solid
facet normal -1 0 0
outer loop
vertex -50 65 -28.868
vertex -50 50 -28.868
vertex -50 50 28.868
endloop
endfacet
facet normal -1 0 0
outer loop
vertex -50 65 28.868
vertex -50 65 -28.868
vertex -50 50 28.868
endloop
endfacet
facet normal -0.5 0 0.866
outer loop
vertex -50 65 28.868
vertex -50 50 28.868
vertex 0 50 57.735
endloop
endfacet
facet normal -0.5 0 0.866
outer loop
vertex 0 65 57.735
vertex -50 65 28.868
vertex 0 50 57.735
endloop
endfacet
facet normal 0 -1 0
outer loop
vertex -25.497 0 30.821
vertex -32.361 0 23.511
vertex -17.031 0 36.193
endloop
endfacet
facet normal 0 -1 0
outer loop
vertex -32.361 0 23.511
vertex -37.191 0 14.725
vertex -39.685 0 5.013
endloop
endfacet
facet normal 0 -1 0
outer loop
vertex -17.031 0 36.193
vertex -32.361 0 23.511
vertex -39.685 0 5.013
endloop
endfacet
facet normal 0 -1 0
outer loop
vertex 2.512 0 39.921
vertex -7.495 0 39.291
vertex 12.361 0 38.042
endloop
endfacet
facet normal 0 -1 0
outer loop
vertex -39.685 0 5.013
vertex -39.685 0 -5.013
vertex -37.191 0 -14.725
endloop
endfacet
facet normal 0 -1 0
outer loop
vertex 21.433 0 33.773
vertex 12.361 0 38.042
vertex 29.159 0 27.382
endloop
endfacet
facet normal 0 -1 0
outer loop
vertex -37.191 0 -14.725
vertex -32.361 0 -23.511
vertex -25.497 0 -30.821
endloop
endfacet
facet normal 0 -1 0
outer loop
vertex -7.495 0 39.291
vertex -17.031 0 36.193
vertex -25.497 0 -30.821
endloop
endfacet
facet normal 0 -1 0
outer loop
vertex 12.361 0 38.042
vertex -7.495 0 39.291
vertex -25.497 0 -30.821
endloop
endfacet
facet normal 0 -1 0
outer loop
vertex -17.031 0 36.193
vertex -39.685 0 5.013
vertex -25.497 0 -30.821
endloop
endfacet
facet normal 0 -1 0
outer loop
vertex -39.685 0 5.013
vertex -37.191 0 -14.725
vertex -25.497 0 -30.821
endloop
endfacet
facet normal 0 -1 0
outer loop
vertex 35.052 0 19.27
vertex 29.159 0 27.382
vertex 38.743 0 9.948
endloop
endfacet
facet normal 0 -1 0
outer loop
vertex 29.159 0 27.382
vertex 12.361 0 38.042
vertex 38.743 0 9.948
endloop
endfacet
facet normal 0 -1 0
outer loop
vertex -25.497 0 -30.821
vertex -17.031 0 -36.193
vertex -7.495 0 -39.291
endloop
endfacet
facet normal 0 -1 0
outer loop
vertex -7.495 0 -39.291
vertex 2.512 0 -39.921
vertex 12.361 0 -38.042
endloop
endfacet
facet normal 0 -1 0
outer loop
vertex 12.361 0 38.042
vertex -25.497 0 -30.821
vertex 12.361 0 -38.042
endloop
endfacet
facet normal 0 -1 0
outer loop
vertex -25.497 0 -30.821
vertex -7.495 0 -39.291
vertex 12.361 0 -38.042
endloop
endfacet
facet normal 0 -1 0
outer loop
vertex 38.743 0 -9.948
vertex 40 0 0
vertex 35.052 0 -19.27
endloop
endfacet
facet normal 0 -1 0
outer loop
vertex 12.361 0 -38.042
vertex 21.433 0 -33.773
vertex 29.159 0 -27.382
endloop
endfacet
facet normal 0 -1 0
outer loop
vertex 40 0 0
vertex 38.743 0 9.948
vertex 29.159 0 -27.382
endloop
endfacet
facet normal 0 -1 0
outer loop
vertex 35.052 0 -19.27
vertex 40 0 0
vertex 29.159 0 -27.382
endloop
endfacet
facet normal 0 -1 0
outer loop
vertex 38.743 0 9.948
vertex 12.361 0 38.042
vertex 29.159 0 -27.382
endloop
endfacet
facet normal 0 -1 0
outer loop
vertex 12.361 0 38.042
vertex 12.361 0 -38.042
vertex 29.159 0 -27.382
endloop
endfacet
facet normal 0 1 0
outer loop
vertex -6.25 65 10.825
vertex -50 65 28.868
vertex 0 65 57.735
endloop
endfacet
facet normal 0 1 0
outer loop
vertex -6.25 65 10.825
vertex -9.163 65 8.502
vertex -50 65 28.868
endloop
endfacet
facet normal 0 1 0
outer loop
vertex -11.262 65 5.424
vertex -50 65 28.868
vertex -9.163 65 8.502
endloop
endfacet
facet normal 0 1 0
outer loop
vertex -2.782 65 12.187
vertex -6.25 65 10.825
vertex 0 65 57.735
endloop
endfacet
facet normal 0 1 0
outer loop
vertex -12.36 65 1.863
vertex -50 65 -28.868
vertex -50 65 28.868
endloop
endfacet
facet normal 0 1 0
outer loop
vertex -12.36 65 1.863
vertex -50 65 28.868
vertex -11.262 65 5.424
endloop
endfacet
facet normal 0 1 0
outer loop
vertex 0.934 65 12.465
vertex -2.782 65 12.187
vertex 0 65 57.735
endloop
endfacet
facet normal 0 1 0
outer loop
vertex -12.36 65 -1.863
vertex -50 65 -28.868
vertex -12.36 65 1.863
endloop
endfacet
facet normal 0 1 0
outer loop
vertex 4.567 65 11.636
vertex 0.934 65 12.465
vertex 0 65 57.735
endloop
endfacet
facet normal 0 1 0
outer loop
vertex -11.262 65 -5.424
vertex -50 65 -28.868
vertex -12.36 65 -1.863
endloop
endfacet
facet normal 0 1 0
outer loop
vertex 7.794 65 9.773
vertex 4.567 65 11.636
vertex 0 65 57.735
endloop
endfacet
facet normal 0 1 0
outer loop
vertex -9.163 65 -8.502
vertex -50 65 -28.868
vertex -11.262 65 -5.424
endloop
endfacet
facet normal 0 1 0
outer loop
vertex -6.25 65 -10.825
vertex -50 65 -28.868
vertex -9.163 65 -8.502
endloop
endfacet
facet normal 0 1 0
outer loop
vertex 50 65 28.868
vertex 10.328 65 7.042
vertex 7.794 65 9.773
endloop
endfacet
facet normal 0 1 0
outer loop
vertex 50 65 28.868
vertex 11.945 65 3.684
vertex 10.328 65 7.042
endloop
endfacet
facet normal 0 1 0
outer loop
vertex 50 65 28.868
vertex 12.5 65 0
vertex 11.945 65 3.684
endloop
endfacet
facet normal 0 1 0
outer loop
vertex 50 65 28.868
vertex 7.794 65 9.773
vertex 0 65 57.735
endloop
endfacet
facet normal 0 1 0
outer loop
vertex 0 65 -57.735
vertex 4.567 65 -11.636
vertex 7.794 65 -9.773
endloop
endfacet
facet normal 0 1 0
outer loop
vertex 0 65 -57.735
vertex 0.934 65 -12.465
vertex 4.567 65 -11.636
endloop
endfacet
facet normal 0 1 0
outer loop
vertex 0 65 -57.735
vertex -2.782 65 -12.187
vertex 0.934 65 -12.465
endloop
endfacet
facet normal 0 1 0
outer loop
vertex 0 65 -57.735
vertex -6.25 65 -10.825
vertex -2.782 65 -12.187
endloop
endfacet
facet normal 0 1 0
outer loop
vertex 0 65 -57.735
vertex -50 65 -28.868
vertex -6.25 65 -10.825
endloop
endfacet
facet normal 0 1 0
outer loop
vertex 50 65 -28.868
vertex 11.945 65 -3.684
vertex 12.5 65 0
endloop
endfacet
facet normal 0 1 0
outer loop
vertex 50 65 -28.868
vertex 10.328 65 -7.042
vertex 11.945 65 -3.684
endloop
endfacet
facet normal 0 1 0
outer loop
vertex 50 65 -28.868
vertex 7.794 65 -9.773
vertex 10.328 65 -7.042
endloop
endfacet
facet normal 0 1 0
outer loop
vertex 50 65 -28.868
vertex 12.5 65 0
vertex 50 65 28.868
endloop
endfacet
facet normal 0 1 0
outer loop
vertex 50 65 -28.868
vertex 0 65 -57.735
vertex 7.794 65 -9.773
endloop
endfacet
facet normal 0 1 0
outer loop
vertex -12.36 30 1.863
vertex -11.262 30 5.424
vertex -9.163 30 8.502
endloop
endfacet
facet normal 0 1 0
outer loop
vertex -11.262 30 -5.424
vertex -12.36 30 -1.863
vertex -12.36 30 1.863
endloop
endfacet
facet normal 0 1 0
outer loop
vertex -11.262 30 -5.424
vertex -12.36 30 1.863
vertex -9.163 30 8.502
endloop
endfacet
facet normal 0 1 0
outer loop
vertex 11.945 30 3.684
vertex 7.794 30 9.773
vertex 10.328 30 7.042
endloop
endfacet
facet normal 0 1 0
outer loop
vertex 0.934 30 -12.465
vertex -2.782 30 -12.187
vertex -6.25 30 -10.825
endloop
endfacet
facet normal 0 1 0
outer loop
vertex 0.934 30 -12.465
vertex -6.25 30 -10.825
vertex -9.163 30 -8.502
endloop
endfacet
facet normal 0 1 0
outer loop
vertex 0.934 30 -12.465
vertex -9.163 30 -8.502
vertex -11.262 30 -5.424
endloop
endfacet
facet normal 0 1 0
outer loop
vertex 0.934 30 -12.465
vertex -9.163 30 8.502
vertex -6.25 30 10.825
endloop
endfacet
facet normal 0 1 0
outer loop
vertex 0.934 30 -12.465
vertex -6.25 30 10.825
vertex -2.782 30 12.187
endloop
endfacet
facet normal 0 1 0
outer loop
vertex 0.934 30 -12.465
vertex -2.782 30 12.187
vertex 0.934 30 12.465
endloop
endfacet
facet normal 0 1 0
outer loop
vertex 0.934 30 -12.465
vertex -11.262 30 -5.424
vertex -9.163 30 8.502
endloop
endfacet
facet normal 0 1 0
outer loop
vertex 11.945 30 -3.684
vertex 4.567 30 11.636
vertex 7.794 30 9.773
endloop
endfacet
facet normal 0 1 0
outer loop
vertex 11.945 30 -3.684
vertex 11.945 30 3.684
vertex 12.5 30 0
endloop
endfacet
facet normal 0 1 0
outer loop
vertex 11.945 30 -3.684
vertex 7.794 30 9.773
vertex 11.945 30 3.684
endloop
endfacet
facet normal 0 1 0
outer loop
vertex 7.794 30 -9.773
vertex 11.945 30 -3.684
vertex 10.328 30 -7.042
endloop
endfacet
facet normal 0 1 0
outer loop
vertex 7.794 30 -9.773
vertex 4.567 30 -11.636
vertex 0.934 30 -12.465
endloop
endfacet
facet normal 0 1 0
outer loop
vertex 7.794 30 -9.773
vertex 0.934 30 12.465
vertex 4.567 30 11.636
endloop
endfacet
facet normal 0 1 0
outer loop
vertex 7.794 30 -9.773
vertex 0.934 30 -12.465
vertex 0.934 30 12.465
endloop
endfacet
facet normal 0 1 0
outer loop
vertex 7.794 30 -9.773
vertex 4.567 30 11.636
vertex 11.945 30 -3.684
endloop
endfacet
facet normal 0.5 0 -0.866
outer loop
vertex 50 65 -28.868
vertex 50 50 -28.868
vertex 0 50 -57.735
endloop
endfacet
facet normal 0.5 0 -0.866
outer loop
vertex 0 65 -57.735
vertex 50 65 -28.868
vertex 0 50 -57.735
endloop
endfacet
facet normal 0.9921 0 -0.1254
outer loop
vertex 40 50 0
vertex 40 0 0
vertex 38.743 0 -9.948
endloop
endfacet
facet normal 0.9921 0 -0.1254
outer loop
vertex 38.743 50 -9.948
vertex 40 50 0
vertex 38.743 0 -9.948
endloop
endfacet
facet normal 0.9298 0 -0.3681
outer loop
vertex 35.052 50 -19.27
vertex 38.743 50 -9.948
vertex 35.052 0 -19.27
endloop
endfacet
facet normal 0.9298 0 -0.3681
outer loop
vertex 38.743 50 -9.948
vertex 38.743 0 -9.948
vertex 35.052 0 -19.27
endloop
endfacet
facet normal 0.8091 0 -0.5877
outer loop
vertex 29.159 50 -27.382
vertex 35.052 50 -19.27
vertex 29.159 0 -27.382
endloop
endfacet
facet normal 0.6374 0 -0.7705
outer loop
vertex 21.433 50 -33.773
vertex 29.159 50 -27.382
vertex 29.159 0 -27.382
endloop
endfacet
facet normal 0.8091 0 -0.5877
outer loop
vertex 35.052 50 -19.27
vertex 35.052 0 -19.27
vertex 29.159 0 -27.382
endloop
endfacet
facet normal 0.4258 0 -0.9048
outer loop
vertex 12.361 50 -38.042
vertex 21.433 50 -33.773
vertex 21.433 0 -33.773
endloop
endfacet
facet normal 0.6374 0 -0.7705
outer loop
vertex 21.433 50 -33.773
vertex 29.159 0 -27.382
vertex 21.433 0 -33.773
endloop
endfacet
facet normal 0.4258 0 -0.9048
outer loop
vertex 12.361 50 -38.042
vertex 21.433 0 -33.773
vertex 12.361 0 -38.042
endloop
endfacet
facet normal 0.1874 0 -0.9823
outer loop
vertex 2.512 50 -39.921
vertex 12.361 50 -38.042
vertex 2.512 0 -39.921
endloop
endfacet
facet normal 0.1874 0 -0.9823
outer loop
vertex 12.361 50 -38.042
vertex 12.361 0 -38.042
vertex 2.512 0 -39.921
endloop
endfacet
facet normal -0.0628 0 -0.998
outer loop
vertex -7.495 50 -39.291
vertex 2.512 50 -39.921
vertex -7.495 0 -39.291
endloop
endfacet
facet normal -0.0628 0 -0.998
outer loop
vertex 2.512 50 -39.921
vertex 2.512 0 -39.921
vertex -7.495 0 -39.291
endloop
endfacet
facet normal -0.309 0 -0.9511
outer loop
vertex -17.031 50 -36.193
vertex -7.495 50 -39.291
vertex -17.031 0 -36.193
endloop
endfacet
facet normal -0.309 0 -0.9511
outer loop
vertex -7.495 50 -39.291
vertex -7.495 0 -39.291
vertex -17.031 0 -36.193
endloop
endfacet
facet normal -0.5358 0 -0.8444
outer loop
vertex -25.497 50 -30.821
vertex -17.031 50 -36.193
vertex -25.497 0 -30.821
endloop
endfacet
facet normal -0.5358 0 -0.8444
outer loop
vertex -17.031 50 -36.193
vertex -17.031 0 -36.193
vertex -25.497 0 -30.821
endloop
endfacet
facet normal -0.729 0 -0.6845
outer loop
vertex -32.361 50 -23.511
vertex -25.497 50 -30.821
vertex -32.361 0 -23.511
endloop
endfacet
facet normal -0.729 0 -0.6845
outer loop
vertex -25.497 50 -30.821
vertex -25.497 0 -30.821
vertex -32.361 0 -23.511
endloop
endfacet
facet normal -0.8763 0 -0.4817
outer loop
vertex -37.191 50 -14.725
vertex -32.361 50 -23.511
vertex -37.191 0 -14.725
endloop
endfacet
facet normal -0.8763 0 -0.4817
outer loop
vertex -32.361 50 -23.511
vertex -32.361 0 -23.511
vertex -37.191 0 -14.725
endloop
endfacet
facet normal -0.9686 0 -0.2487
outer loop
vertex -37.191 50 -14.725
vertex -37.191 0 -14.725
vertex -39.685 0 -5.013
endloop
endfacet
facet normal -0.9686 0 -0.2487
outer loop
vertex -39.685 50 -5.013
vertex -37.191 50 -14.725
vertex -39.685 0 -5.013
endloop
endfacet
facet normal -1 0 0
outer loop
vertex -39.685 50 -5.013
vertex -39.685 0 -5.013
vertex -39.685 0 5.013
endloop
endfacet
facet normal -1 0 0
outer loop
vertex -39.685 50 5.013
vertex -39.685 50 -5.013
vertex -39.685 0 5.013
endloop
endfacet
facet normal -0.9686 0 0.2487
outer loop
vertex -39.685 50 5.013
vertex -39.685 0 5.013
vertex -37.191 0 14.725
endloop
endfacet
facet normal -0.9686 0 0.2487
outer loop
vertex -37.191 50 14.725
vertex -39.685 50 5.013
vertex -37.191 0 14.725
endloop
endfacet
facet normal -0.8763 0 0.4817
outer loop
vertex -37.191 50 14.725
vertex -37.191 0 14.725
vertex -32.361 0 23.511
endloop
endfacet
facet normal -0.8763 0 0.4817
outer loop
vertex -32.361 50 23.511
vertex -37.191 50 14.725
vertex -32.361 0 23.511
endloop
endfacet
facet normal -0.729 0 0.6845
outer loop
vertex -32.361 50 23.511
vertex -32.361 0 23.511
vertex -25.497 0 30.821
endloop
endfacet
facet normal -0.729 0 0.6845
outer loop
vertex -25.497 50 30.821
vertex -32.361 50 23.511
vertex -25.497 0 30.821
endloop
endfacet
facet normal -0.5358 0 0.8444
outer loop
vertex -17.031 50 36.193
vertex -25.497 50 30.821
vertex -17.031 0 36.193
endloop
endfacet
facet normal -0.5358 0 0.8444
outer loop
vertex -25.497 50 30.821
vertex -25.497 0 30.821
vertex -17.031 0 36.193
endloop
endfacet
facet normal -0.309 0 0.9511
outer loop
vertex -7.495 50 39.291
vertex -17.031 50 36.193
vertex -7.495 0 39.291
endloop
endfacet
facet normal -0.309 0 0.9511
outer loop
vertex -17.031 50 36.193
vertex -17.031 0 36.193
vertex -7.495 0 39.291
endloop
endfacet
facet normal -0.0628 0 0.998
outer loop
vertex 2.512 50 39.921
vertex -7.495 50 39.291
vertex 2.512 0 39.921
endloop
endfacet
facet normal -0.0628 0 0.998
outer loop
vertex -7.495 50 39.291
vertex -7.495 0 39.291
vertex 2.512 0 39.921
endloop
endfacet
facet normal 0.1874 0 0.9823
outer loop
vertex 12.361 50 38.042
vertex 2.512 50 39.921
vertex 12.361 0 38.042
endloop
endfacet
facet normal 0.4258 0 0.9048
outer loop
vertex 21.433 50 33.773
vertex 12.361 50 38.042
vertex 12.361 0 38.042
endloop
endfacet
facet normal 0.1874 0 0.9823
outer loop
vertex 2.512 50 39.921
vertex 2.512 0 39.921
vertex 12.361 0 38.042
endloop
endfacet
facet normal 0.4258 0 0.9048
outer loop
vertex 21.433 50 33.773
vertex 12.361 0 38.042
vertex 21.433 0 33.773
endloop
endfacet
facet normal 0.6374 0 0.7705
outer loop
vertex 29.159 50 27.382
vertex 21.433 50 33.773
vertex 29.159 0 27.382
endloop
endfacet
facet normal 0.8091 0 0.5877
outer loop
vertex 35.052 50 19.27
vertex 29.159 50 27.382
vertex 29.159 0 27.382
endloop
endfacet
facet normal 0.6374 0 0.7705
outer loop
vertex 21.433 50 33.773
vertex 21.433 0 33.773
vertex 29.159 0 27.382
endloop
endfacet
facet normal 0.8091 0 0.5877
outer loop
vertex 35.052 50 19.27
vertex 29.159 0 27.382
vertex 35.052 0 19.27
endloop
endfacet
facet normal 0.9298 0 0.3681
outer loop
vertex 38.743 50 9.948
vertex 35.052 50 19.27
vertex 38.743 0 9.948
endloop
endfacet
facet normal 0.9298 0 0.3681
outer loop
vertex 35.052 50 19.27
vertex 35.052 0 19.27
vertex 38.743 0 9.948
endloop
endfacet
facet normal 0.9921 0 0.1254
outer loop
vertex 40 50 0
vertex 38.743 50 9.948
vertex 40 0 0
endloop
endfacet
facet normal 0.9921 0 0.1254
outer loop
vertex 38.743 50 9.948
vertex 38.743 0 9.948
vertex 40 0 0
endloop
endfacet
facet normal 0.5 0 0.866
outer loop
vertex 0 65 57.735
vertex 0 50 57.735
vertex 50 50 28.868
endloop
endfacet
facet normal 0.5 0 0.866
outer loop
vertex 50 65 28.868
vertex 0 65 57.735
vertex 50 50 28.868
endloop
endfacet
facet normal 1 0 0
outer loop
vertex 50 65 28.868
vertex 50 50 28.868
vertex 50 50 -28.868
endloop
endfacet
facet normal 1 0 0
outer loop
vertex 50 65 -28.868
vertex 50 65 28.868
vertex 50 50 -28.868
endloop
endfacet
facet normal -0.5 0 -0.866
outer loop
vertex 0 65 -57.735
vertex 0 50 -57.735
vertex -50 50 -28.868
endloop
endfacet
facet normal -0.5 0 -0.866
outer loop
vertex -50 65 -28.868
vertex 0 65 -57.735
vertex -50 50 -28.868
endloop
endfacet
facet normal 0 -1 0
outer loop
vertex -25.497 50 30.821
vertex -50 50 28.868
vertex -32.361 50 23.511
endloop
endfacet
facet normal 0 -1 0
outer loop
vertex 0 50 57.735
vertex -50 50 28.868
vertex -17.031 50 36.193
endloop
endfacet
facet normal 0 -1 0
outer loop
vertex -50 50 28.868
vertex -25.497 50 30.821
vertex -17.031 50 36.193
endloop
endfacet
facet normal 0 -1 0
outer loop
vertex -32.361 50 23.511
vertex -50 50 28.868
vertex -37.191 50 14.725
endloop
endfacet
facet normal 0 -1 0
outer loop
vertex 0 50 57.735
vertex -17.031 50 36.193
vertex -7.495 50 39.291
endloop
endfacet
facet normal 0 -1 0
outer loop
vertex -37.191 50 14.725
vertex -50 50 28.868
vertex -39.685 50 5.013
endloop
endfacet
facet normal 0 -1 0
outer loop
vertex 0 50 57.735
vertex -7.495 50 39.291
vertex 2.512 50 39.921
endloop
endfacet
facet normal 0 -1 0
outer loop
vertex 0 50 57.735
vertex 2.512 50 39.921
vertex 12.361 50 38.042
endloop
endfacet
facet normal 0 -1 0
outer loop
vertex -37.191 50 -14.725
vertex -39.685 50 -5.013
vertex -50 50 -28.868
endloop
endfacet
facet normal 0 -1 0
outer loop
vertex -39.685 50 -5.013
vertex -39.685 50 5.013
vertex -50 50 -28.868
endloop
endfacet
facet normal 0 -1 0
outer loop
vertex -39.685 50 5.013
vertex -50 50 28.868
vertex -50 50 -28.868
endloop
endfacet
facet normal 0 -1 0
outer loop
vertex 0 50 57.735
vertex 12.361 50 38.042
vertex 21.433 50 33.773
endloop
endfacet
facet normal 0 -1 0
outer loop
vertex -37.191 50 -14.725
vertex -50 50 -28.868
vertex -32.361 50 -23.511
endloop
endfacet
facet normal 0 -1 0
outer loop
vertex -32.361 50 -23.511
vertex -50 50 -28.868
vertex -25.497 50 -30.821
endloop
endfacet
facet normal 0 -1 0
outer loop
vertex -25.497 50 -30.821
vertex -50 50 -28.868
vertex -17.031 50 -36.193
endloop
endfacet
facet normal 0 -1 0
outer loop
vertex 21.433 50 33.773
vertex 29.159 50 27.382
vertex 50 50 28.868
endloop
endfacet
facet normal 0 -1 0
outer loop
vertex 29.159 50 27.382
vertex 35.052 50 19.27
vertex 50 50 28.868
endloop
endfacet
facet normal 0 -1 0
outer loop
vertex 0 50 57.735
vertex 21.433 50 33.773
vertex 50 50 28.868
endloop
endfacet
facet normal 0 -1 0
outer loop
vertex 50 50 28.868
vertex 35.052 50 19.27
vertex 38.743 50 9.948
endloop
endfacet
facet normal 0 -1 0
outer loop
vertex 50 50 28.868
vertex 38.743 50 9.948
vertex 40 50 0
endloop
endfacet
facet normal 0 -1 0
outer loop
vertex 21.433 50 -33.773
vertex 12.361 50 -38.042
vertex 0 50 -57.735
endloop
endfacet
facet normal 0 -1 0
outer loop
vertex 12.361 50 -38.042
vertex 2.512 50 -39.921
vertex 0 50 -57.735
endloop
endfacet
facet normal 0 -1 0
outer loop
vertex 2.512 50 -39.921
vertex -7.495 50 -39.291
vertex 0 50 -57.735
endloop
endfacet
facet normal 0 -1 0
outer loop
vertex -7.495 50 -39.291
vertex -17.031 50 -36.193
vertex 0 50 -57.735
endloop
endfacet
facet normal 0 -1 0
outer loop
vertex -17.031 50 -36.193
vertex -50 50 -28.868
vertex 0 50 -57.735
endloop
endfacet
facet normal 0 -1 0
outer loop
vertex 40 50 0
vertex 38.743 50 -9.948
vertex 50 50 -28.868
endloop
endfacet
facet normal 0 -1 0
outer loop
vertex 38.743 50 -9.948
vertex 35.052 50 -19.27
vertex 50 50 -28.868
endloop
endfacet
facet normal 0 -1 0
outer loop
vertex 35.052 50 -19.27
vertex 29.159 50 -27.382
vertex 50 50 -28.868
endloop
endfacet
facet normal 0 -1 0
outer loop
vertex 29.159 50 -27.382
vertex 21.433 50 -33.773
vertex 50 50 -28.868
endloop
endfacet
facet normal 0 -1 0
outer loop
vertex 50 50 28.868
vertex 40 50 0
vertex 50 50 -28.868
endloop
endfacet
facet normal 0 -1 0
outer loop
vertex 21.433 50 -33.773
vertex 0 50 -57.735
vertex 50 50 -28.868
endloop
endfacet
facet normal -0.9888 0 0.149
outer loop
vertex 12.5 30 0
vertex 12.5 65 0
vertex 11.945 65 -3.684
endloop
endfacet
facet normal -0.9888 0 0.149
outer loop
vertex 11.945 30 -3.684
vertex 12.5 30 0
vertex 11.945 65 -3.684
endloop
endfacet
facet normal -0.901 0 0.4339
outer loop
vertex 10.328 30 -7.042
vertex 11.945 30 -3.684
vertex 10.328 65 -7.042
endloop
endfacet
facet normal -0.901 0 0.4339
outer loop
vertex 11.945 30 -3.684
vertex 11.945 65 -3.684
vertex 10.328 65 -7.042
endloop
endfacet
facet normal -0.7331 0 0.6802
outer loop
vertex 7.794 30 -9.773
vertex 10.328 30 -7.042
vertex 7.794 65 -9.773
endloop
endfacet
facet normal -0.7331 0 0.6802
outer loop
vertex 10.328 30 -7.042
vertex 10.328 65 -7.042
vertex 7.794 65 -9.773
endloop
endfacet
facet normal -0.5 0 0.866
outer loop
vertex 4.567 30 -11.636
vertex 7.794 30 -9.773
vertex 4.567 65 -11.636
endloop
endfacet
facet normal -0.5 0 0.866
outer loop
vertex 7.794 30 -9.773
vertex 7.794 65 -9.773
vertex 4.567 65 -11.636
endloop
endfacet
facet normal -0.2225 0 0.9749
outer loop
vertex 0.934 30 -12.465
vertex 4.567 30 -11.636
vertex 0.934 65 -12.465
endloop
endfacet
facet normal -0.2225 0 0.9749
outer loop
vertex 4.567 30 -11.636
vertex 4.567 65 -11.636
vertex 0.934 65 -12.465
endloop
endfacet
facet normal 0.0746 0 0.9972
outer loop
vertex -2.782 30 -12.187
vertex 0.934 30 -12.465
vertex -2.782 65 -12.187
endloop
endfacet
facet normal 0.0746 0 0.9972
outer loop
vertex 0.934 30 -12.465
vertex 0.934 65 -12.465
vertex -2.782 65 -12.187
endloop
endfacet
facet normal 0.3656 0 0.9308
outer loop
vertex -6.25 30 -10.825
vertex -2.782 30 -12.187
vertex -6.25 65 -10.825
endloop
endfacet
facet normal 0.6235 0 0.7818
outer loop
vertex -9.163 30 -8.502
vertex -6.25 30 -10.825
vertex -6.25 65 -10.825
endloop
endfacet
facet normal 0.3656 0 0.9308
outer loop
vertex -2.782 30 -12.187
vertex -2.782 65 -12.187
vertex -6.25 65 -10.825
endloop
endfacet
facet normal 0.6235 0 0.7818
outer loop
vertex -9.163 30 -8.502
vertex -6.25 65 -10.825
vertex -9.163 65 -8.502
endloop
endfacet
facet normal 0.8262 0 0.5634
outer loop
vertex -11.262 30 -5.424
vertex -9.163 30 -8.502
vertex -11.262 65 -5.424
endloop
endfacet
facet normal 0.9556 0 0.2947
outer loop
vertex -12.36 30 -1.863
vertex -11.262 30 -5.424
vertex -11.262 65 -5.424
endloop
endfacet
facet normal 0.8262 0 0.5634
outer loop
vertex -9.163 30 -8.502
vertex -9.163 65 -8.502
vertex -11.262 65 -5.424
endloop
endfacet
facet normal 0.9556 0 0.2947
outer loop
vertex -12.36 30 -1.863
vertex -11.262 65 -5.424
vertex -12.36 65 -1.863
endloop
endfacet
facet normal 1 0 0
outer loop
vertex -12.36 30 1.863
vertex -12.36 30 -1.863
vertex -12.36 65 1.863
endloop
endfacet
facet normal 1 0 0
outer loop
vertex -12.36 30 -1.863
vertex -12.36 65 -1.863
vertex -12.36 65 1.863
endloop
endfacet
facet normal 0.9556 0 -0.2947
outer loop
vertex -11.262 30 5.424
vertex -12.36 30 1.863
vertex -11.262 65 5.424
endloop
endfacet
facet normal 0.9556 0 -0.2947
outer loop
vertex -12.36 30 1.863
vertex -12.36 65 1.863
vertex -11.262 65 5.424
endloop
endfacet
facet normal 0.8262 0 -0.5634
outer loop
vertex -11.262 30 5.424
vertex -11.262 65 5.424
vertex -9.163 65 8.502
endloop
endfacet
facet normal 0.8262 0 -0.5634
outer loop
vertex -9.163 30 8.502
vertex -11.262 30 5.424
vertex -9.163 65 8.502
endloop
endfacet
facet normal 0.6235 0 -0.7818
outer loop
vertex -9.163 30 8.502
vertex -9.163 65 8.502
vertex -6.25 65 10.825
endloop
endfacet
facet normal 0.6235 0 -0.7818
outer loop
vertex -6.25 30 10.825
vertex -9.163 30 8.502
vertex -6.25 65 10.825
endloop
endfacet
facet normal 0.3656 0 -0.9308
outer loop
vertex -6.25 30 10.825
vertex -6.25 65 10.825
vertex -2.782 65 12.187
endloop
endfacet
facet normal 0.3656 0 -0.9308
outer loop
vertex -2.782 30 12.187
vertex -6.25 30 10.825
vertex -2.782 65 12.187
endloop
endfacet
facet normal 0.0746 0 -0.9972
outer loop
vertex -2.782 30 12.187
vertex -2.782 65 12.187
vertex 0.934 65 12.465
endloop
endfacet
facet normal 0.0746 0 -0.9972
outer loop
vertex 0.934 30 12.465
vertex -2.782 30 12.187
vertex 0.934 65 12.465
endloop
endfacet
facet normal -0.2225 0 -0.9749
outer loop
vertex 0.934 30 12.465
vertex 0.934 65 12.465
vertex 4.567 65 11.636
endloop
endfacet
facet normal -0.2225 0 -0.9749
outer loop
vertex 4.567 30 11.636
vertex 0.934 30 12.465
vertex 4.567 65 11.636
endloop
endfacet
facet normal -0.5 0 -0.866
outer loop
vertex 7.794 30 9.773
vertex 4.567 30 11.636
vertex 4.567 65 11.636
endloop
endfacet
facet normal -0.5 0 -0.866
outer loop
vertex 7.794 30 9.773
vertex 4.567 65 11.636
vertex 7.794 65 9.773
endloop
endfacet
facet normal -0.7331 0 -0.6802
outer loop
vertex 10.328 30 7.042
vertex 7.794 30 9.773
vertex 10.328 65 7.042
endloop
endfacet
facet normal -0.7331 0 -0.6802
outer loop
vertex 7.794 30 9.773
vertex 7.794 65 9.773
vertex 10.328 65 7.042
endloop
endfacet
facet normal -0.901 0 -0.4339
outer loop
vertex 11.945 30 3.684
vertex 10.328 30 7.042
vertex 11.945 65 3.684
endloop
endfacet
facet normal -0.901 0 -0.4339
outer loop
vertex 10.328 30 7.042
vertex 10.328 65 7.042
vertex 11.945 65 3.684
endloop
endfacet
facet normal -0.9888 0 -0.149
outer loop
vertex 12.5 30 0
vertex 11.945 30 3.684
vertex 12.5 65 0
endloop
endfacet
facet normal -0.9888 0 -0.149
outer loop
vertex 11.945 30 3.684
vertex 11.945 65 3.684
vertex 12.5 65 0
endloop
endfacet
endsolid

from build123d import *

# Parameters (mm, degrees)
SKETCH1_R           = 40
BOSS_EXTRUDE1_DEPTH = 50
BOSS_EXTRUDE2_DEPTH = 15
SKETCH4_R           = 12.5
CUT_EXTRUDE1_DEPTH  = 35


with BuildPart() as part:
    # Sketch1 → Boss-Extrude1 (new body)
    with BuildSketch(Plane(origin=(0, 0, 0), x_dir=(1, 0, 0), z_dir=(0, 1, 0))):
        Circle(SKETCH1_R)
    extrude(amount=BOSS_EXTRUDE1_DEPTH)

    # Sketch2 → Boss-Extrude2 (add)
    with BuildSketch(Plane(origin=(0, 50, 0), x_dir=(1, 0, 0), z_dir=(0, 1, 0))):
        Polygon((0, -57.735026919), (50, -28.867513459), (50, 28.867513459), (0, 57.735026919), (-50, 28.867513459), (-50, -28.867513459), align=None)
    extrude(amount=BOSS_EXTRUDE2_DEPTH)

    # Sketch4 → Cut-Extrude1 (cut)
    with BuildSketch(Plane(origin=(0, 65, 0), x_dir=(1, 0, 0), z_dir=(0, 1, 0))):
        Circle(SKETCH4_R)
    extrude(amount=-CUT_EXTRUDE1_DEPTH, mode=Mode.SUBTRACT)


solid = part.part
